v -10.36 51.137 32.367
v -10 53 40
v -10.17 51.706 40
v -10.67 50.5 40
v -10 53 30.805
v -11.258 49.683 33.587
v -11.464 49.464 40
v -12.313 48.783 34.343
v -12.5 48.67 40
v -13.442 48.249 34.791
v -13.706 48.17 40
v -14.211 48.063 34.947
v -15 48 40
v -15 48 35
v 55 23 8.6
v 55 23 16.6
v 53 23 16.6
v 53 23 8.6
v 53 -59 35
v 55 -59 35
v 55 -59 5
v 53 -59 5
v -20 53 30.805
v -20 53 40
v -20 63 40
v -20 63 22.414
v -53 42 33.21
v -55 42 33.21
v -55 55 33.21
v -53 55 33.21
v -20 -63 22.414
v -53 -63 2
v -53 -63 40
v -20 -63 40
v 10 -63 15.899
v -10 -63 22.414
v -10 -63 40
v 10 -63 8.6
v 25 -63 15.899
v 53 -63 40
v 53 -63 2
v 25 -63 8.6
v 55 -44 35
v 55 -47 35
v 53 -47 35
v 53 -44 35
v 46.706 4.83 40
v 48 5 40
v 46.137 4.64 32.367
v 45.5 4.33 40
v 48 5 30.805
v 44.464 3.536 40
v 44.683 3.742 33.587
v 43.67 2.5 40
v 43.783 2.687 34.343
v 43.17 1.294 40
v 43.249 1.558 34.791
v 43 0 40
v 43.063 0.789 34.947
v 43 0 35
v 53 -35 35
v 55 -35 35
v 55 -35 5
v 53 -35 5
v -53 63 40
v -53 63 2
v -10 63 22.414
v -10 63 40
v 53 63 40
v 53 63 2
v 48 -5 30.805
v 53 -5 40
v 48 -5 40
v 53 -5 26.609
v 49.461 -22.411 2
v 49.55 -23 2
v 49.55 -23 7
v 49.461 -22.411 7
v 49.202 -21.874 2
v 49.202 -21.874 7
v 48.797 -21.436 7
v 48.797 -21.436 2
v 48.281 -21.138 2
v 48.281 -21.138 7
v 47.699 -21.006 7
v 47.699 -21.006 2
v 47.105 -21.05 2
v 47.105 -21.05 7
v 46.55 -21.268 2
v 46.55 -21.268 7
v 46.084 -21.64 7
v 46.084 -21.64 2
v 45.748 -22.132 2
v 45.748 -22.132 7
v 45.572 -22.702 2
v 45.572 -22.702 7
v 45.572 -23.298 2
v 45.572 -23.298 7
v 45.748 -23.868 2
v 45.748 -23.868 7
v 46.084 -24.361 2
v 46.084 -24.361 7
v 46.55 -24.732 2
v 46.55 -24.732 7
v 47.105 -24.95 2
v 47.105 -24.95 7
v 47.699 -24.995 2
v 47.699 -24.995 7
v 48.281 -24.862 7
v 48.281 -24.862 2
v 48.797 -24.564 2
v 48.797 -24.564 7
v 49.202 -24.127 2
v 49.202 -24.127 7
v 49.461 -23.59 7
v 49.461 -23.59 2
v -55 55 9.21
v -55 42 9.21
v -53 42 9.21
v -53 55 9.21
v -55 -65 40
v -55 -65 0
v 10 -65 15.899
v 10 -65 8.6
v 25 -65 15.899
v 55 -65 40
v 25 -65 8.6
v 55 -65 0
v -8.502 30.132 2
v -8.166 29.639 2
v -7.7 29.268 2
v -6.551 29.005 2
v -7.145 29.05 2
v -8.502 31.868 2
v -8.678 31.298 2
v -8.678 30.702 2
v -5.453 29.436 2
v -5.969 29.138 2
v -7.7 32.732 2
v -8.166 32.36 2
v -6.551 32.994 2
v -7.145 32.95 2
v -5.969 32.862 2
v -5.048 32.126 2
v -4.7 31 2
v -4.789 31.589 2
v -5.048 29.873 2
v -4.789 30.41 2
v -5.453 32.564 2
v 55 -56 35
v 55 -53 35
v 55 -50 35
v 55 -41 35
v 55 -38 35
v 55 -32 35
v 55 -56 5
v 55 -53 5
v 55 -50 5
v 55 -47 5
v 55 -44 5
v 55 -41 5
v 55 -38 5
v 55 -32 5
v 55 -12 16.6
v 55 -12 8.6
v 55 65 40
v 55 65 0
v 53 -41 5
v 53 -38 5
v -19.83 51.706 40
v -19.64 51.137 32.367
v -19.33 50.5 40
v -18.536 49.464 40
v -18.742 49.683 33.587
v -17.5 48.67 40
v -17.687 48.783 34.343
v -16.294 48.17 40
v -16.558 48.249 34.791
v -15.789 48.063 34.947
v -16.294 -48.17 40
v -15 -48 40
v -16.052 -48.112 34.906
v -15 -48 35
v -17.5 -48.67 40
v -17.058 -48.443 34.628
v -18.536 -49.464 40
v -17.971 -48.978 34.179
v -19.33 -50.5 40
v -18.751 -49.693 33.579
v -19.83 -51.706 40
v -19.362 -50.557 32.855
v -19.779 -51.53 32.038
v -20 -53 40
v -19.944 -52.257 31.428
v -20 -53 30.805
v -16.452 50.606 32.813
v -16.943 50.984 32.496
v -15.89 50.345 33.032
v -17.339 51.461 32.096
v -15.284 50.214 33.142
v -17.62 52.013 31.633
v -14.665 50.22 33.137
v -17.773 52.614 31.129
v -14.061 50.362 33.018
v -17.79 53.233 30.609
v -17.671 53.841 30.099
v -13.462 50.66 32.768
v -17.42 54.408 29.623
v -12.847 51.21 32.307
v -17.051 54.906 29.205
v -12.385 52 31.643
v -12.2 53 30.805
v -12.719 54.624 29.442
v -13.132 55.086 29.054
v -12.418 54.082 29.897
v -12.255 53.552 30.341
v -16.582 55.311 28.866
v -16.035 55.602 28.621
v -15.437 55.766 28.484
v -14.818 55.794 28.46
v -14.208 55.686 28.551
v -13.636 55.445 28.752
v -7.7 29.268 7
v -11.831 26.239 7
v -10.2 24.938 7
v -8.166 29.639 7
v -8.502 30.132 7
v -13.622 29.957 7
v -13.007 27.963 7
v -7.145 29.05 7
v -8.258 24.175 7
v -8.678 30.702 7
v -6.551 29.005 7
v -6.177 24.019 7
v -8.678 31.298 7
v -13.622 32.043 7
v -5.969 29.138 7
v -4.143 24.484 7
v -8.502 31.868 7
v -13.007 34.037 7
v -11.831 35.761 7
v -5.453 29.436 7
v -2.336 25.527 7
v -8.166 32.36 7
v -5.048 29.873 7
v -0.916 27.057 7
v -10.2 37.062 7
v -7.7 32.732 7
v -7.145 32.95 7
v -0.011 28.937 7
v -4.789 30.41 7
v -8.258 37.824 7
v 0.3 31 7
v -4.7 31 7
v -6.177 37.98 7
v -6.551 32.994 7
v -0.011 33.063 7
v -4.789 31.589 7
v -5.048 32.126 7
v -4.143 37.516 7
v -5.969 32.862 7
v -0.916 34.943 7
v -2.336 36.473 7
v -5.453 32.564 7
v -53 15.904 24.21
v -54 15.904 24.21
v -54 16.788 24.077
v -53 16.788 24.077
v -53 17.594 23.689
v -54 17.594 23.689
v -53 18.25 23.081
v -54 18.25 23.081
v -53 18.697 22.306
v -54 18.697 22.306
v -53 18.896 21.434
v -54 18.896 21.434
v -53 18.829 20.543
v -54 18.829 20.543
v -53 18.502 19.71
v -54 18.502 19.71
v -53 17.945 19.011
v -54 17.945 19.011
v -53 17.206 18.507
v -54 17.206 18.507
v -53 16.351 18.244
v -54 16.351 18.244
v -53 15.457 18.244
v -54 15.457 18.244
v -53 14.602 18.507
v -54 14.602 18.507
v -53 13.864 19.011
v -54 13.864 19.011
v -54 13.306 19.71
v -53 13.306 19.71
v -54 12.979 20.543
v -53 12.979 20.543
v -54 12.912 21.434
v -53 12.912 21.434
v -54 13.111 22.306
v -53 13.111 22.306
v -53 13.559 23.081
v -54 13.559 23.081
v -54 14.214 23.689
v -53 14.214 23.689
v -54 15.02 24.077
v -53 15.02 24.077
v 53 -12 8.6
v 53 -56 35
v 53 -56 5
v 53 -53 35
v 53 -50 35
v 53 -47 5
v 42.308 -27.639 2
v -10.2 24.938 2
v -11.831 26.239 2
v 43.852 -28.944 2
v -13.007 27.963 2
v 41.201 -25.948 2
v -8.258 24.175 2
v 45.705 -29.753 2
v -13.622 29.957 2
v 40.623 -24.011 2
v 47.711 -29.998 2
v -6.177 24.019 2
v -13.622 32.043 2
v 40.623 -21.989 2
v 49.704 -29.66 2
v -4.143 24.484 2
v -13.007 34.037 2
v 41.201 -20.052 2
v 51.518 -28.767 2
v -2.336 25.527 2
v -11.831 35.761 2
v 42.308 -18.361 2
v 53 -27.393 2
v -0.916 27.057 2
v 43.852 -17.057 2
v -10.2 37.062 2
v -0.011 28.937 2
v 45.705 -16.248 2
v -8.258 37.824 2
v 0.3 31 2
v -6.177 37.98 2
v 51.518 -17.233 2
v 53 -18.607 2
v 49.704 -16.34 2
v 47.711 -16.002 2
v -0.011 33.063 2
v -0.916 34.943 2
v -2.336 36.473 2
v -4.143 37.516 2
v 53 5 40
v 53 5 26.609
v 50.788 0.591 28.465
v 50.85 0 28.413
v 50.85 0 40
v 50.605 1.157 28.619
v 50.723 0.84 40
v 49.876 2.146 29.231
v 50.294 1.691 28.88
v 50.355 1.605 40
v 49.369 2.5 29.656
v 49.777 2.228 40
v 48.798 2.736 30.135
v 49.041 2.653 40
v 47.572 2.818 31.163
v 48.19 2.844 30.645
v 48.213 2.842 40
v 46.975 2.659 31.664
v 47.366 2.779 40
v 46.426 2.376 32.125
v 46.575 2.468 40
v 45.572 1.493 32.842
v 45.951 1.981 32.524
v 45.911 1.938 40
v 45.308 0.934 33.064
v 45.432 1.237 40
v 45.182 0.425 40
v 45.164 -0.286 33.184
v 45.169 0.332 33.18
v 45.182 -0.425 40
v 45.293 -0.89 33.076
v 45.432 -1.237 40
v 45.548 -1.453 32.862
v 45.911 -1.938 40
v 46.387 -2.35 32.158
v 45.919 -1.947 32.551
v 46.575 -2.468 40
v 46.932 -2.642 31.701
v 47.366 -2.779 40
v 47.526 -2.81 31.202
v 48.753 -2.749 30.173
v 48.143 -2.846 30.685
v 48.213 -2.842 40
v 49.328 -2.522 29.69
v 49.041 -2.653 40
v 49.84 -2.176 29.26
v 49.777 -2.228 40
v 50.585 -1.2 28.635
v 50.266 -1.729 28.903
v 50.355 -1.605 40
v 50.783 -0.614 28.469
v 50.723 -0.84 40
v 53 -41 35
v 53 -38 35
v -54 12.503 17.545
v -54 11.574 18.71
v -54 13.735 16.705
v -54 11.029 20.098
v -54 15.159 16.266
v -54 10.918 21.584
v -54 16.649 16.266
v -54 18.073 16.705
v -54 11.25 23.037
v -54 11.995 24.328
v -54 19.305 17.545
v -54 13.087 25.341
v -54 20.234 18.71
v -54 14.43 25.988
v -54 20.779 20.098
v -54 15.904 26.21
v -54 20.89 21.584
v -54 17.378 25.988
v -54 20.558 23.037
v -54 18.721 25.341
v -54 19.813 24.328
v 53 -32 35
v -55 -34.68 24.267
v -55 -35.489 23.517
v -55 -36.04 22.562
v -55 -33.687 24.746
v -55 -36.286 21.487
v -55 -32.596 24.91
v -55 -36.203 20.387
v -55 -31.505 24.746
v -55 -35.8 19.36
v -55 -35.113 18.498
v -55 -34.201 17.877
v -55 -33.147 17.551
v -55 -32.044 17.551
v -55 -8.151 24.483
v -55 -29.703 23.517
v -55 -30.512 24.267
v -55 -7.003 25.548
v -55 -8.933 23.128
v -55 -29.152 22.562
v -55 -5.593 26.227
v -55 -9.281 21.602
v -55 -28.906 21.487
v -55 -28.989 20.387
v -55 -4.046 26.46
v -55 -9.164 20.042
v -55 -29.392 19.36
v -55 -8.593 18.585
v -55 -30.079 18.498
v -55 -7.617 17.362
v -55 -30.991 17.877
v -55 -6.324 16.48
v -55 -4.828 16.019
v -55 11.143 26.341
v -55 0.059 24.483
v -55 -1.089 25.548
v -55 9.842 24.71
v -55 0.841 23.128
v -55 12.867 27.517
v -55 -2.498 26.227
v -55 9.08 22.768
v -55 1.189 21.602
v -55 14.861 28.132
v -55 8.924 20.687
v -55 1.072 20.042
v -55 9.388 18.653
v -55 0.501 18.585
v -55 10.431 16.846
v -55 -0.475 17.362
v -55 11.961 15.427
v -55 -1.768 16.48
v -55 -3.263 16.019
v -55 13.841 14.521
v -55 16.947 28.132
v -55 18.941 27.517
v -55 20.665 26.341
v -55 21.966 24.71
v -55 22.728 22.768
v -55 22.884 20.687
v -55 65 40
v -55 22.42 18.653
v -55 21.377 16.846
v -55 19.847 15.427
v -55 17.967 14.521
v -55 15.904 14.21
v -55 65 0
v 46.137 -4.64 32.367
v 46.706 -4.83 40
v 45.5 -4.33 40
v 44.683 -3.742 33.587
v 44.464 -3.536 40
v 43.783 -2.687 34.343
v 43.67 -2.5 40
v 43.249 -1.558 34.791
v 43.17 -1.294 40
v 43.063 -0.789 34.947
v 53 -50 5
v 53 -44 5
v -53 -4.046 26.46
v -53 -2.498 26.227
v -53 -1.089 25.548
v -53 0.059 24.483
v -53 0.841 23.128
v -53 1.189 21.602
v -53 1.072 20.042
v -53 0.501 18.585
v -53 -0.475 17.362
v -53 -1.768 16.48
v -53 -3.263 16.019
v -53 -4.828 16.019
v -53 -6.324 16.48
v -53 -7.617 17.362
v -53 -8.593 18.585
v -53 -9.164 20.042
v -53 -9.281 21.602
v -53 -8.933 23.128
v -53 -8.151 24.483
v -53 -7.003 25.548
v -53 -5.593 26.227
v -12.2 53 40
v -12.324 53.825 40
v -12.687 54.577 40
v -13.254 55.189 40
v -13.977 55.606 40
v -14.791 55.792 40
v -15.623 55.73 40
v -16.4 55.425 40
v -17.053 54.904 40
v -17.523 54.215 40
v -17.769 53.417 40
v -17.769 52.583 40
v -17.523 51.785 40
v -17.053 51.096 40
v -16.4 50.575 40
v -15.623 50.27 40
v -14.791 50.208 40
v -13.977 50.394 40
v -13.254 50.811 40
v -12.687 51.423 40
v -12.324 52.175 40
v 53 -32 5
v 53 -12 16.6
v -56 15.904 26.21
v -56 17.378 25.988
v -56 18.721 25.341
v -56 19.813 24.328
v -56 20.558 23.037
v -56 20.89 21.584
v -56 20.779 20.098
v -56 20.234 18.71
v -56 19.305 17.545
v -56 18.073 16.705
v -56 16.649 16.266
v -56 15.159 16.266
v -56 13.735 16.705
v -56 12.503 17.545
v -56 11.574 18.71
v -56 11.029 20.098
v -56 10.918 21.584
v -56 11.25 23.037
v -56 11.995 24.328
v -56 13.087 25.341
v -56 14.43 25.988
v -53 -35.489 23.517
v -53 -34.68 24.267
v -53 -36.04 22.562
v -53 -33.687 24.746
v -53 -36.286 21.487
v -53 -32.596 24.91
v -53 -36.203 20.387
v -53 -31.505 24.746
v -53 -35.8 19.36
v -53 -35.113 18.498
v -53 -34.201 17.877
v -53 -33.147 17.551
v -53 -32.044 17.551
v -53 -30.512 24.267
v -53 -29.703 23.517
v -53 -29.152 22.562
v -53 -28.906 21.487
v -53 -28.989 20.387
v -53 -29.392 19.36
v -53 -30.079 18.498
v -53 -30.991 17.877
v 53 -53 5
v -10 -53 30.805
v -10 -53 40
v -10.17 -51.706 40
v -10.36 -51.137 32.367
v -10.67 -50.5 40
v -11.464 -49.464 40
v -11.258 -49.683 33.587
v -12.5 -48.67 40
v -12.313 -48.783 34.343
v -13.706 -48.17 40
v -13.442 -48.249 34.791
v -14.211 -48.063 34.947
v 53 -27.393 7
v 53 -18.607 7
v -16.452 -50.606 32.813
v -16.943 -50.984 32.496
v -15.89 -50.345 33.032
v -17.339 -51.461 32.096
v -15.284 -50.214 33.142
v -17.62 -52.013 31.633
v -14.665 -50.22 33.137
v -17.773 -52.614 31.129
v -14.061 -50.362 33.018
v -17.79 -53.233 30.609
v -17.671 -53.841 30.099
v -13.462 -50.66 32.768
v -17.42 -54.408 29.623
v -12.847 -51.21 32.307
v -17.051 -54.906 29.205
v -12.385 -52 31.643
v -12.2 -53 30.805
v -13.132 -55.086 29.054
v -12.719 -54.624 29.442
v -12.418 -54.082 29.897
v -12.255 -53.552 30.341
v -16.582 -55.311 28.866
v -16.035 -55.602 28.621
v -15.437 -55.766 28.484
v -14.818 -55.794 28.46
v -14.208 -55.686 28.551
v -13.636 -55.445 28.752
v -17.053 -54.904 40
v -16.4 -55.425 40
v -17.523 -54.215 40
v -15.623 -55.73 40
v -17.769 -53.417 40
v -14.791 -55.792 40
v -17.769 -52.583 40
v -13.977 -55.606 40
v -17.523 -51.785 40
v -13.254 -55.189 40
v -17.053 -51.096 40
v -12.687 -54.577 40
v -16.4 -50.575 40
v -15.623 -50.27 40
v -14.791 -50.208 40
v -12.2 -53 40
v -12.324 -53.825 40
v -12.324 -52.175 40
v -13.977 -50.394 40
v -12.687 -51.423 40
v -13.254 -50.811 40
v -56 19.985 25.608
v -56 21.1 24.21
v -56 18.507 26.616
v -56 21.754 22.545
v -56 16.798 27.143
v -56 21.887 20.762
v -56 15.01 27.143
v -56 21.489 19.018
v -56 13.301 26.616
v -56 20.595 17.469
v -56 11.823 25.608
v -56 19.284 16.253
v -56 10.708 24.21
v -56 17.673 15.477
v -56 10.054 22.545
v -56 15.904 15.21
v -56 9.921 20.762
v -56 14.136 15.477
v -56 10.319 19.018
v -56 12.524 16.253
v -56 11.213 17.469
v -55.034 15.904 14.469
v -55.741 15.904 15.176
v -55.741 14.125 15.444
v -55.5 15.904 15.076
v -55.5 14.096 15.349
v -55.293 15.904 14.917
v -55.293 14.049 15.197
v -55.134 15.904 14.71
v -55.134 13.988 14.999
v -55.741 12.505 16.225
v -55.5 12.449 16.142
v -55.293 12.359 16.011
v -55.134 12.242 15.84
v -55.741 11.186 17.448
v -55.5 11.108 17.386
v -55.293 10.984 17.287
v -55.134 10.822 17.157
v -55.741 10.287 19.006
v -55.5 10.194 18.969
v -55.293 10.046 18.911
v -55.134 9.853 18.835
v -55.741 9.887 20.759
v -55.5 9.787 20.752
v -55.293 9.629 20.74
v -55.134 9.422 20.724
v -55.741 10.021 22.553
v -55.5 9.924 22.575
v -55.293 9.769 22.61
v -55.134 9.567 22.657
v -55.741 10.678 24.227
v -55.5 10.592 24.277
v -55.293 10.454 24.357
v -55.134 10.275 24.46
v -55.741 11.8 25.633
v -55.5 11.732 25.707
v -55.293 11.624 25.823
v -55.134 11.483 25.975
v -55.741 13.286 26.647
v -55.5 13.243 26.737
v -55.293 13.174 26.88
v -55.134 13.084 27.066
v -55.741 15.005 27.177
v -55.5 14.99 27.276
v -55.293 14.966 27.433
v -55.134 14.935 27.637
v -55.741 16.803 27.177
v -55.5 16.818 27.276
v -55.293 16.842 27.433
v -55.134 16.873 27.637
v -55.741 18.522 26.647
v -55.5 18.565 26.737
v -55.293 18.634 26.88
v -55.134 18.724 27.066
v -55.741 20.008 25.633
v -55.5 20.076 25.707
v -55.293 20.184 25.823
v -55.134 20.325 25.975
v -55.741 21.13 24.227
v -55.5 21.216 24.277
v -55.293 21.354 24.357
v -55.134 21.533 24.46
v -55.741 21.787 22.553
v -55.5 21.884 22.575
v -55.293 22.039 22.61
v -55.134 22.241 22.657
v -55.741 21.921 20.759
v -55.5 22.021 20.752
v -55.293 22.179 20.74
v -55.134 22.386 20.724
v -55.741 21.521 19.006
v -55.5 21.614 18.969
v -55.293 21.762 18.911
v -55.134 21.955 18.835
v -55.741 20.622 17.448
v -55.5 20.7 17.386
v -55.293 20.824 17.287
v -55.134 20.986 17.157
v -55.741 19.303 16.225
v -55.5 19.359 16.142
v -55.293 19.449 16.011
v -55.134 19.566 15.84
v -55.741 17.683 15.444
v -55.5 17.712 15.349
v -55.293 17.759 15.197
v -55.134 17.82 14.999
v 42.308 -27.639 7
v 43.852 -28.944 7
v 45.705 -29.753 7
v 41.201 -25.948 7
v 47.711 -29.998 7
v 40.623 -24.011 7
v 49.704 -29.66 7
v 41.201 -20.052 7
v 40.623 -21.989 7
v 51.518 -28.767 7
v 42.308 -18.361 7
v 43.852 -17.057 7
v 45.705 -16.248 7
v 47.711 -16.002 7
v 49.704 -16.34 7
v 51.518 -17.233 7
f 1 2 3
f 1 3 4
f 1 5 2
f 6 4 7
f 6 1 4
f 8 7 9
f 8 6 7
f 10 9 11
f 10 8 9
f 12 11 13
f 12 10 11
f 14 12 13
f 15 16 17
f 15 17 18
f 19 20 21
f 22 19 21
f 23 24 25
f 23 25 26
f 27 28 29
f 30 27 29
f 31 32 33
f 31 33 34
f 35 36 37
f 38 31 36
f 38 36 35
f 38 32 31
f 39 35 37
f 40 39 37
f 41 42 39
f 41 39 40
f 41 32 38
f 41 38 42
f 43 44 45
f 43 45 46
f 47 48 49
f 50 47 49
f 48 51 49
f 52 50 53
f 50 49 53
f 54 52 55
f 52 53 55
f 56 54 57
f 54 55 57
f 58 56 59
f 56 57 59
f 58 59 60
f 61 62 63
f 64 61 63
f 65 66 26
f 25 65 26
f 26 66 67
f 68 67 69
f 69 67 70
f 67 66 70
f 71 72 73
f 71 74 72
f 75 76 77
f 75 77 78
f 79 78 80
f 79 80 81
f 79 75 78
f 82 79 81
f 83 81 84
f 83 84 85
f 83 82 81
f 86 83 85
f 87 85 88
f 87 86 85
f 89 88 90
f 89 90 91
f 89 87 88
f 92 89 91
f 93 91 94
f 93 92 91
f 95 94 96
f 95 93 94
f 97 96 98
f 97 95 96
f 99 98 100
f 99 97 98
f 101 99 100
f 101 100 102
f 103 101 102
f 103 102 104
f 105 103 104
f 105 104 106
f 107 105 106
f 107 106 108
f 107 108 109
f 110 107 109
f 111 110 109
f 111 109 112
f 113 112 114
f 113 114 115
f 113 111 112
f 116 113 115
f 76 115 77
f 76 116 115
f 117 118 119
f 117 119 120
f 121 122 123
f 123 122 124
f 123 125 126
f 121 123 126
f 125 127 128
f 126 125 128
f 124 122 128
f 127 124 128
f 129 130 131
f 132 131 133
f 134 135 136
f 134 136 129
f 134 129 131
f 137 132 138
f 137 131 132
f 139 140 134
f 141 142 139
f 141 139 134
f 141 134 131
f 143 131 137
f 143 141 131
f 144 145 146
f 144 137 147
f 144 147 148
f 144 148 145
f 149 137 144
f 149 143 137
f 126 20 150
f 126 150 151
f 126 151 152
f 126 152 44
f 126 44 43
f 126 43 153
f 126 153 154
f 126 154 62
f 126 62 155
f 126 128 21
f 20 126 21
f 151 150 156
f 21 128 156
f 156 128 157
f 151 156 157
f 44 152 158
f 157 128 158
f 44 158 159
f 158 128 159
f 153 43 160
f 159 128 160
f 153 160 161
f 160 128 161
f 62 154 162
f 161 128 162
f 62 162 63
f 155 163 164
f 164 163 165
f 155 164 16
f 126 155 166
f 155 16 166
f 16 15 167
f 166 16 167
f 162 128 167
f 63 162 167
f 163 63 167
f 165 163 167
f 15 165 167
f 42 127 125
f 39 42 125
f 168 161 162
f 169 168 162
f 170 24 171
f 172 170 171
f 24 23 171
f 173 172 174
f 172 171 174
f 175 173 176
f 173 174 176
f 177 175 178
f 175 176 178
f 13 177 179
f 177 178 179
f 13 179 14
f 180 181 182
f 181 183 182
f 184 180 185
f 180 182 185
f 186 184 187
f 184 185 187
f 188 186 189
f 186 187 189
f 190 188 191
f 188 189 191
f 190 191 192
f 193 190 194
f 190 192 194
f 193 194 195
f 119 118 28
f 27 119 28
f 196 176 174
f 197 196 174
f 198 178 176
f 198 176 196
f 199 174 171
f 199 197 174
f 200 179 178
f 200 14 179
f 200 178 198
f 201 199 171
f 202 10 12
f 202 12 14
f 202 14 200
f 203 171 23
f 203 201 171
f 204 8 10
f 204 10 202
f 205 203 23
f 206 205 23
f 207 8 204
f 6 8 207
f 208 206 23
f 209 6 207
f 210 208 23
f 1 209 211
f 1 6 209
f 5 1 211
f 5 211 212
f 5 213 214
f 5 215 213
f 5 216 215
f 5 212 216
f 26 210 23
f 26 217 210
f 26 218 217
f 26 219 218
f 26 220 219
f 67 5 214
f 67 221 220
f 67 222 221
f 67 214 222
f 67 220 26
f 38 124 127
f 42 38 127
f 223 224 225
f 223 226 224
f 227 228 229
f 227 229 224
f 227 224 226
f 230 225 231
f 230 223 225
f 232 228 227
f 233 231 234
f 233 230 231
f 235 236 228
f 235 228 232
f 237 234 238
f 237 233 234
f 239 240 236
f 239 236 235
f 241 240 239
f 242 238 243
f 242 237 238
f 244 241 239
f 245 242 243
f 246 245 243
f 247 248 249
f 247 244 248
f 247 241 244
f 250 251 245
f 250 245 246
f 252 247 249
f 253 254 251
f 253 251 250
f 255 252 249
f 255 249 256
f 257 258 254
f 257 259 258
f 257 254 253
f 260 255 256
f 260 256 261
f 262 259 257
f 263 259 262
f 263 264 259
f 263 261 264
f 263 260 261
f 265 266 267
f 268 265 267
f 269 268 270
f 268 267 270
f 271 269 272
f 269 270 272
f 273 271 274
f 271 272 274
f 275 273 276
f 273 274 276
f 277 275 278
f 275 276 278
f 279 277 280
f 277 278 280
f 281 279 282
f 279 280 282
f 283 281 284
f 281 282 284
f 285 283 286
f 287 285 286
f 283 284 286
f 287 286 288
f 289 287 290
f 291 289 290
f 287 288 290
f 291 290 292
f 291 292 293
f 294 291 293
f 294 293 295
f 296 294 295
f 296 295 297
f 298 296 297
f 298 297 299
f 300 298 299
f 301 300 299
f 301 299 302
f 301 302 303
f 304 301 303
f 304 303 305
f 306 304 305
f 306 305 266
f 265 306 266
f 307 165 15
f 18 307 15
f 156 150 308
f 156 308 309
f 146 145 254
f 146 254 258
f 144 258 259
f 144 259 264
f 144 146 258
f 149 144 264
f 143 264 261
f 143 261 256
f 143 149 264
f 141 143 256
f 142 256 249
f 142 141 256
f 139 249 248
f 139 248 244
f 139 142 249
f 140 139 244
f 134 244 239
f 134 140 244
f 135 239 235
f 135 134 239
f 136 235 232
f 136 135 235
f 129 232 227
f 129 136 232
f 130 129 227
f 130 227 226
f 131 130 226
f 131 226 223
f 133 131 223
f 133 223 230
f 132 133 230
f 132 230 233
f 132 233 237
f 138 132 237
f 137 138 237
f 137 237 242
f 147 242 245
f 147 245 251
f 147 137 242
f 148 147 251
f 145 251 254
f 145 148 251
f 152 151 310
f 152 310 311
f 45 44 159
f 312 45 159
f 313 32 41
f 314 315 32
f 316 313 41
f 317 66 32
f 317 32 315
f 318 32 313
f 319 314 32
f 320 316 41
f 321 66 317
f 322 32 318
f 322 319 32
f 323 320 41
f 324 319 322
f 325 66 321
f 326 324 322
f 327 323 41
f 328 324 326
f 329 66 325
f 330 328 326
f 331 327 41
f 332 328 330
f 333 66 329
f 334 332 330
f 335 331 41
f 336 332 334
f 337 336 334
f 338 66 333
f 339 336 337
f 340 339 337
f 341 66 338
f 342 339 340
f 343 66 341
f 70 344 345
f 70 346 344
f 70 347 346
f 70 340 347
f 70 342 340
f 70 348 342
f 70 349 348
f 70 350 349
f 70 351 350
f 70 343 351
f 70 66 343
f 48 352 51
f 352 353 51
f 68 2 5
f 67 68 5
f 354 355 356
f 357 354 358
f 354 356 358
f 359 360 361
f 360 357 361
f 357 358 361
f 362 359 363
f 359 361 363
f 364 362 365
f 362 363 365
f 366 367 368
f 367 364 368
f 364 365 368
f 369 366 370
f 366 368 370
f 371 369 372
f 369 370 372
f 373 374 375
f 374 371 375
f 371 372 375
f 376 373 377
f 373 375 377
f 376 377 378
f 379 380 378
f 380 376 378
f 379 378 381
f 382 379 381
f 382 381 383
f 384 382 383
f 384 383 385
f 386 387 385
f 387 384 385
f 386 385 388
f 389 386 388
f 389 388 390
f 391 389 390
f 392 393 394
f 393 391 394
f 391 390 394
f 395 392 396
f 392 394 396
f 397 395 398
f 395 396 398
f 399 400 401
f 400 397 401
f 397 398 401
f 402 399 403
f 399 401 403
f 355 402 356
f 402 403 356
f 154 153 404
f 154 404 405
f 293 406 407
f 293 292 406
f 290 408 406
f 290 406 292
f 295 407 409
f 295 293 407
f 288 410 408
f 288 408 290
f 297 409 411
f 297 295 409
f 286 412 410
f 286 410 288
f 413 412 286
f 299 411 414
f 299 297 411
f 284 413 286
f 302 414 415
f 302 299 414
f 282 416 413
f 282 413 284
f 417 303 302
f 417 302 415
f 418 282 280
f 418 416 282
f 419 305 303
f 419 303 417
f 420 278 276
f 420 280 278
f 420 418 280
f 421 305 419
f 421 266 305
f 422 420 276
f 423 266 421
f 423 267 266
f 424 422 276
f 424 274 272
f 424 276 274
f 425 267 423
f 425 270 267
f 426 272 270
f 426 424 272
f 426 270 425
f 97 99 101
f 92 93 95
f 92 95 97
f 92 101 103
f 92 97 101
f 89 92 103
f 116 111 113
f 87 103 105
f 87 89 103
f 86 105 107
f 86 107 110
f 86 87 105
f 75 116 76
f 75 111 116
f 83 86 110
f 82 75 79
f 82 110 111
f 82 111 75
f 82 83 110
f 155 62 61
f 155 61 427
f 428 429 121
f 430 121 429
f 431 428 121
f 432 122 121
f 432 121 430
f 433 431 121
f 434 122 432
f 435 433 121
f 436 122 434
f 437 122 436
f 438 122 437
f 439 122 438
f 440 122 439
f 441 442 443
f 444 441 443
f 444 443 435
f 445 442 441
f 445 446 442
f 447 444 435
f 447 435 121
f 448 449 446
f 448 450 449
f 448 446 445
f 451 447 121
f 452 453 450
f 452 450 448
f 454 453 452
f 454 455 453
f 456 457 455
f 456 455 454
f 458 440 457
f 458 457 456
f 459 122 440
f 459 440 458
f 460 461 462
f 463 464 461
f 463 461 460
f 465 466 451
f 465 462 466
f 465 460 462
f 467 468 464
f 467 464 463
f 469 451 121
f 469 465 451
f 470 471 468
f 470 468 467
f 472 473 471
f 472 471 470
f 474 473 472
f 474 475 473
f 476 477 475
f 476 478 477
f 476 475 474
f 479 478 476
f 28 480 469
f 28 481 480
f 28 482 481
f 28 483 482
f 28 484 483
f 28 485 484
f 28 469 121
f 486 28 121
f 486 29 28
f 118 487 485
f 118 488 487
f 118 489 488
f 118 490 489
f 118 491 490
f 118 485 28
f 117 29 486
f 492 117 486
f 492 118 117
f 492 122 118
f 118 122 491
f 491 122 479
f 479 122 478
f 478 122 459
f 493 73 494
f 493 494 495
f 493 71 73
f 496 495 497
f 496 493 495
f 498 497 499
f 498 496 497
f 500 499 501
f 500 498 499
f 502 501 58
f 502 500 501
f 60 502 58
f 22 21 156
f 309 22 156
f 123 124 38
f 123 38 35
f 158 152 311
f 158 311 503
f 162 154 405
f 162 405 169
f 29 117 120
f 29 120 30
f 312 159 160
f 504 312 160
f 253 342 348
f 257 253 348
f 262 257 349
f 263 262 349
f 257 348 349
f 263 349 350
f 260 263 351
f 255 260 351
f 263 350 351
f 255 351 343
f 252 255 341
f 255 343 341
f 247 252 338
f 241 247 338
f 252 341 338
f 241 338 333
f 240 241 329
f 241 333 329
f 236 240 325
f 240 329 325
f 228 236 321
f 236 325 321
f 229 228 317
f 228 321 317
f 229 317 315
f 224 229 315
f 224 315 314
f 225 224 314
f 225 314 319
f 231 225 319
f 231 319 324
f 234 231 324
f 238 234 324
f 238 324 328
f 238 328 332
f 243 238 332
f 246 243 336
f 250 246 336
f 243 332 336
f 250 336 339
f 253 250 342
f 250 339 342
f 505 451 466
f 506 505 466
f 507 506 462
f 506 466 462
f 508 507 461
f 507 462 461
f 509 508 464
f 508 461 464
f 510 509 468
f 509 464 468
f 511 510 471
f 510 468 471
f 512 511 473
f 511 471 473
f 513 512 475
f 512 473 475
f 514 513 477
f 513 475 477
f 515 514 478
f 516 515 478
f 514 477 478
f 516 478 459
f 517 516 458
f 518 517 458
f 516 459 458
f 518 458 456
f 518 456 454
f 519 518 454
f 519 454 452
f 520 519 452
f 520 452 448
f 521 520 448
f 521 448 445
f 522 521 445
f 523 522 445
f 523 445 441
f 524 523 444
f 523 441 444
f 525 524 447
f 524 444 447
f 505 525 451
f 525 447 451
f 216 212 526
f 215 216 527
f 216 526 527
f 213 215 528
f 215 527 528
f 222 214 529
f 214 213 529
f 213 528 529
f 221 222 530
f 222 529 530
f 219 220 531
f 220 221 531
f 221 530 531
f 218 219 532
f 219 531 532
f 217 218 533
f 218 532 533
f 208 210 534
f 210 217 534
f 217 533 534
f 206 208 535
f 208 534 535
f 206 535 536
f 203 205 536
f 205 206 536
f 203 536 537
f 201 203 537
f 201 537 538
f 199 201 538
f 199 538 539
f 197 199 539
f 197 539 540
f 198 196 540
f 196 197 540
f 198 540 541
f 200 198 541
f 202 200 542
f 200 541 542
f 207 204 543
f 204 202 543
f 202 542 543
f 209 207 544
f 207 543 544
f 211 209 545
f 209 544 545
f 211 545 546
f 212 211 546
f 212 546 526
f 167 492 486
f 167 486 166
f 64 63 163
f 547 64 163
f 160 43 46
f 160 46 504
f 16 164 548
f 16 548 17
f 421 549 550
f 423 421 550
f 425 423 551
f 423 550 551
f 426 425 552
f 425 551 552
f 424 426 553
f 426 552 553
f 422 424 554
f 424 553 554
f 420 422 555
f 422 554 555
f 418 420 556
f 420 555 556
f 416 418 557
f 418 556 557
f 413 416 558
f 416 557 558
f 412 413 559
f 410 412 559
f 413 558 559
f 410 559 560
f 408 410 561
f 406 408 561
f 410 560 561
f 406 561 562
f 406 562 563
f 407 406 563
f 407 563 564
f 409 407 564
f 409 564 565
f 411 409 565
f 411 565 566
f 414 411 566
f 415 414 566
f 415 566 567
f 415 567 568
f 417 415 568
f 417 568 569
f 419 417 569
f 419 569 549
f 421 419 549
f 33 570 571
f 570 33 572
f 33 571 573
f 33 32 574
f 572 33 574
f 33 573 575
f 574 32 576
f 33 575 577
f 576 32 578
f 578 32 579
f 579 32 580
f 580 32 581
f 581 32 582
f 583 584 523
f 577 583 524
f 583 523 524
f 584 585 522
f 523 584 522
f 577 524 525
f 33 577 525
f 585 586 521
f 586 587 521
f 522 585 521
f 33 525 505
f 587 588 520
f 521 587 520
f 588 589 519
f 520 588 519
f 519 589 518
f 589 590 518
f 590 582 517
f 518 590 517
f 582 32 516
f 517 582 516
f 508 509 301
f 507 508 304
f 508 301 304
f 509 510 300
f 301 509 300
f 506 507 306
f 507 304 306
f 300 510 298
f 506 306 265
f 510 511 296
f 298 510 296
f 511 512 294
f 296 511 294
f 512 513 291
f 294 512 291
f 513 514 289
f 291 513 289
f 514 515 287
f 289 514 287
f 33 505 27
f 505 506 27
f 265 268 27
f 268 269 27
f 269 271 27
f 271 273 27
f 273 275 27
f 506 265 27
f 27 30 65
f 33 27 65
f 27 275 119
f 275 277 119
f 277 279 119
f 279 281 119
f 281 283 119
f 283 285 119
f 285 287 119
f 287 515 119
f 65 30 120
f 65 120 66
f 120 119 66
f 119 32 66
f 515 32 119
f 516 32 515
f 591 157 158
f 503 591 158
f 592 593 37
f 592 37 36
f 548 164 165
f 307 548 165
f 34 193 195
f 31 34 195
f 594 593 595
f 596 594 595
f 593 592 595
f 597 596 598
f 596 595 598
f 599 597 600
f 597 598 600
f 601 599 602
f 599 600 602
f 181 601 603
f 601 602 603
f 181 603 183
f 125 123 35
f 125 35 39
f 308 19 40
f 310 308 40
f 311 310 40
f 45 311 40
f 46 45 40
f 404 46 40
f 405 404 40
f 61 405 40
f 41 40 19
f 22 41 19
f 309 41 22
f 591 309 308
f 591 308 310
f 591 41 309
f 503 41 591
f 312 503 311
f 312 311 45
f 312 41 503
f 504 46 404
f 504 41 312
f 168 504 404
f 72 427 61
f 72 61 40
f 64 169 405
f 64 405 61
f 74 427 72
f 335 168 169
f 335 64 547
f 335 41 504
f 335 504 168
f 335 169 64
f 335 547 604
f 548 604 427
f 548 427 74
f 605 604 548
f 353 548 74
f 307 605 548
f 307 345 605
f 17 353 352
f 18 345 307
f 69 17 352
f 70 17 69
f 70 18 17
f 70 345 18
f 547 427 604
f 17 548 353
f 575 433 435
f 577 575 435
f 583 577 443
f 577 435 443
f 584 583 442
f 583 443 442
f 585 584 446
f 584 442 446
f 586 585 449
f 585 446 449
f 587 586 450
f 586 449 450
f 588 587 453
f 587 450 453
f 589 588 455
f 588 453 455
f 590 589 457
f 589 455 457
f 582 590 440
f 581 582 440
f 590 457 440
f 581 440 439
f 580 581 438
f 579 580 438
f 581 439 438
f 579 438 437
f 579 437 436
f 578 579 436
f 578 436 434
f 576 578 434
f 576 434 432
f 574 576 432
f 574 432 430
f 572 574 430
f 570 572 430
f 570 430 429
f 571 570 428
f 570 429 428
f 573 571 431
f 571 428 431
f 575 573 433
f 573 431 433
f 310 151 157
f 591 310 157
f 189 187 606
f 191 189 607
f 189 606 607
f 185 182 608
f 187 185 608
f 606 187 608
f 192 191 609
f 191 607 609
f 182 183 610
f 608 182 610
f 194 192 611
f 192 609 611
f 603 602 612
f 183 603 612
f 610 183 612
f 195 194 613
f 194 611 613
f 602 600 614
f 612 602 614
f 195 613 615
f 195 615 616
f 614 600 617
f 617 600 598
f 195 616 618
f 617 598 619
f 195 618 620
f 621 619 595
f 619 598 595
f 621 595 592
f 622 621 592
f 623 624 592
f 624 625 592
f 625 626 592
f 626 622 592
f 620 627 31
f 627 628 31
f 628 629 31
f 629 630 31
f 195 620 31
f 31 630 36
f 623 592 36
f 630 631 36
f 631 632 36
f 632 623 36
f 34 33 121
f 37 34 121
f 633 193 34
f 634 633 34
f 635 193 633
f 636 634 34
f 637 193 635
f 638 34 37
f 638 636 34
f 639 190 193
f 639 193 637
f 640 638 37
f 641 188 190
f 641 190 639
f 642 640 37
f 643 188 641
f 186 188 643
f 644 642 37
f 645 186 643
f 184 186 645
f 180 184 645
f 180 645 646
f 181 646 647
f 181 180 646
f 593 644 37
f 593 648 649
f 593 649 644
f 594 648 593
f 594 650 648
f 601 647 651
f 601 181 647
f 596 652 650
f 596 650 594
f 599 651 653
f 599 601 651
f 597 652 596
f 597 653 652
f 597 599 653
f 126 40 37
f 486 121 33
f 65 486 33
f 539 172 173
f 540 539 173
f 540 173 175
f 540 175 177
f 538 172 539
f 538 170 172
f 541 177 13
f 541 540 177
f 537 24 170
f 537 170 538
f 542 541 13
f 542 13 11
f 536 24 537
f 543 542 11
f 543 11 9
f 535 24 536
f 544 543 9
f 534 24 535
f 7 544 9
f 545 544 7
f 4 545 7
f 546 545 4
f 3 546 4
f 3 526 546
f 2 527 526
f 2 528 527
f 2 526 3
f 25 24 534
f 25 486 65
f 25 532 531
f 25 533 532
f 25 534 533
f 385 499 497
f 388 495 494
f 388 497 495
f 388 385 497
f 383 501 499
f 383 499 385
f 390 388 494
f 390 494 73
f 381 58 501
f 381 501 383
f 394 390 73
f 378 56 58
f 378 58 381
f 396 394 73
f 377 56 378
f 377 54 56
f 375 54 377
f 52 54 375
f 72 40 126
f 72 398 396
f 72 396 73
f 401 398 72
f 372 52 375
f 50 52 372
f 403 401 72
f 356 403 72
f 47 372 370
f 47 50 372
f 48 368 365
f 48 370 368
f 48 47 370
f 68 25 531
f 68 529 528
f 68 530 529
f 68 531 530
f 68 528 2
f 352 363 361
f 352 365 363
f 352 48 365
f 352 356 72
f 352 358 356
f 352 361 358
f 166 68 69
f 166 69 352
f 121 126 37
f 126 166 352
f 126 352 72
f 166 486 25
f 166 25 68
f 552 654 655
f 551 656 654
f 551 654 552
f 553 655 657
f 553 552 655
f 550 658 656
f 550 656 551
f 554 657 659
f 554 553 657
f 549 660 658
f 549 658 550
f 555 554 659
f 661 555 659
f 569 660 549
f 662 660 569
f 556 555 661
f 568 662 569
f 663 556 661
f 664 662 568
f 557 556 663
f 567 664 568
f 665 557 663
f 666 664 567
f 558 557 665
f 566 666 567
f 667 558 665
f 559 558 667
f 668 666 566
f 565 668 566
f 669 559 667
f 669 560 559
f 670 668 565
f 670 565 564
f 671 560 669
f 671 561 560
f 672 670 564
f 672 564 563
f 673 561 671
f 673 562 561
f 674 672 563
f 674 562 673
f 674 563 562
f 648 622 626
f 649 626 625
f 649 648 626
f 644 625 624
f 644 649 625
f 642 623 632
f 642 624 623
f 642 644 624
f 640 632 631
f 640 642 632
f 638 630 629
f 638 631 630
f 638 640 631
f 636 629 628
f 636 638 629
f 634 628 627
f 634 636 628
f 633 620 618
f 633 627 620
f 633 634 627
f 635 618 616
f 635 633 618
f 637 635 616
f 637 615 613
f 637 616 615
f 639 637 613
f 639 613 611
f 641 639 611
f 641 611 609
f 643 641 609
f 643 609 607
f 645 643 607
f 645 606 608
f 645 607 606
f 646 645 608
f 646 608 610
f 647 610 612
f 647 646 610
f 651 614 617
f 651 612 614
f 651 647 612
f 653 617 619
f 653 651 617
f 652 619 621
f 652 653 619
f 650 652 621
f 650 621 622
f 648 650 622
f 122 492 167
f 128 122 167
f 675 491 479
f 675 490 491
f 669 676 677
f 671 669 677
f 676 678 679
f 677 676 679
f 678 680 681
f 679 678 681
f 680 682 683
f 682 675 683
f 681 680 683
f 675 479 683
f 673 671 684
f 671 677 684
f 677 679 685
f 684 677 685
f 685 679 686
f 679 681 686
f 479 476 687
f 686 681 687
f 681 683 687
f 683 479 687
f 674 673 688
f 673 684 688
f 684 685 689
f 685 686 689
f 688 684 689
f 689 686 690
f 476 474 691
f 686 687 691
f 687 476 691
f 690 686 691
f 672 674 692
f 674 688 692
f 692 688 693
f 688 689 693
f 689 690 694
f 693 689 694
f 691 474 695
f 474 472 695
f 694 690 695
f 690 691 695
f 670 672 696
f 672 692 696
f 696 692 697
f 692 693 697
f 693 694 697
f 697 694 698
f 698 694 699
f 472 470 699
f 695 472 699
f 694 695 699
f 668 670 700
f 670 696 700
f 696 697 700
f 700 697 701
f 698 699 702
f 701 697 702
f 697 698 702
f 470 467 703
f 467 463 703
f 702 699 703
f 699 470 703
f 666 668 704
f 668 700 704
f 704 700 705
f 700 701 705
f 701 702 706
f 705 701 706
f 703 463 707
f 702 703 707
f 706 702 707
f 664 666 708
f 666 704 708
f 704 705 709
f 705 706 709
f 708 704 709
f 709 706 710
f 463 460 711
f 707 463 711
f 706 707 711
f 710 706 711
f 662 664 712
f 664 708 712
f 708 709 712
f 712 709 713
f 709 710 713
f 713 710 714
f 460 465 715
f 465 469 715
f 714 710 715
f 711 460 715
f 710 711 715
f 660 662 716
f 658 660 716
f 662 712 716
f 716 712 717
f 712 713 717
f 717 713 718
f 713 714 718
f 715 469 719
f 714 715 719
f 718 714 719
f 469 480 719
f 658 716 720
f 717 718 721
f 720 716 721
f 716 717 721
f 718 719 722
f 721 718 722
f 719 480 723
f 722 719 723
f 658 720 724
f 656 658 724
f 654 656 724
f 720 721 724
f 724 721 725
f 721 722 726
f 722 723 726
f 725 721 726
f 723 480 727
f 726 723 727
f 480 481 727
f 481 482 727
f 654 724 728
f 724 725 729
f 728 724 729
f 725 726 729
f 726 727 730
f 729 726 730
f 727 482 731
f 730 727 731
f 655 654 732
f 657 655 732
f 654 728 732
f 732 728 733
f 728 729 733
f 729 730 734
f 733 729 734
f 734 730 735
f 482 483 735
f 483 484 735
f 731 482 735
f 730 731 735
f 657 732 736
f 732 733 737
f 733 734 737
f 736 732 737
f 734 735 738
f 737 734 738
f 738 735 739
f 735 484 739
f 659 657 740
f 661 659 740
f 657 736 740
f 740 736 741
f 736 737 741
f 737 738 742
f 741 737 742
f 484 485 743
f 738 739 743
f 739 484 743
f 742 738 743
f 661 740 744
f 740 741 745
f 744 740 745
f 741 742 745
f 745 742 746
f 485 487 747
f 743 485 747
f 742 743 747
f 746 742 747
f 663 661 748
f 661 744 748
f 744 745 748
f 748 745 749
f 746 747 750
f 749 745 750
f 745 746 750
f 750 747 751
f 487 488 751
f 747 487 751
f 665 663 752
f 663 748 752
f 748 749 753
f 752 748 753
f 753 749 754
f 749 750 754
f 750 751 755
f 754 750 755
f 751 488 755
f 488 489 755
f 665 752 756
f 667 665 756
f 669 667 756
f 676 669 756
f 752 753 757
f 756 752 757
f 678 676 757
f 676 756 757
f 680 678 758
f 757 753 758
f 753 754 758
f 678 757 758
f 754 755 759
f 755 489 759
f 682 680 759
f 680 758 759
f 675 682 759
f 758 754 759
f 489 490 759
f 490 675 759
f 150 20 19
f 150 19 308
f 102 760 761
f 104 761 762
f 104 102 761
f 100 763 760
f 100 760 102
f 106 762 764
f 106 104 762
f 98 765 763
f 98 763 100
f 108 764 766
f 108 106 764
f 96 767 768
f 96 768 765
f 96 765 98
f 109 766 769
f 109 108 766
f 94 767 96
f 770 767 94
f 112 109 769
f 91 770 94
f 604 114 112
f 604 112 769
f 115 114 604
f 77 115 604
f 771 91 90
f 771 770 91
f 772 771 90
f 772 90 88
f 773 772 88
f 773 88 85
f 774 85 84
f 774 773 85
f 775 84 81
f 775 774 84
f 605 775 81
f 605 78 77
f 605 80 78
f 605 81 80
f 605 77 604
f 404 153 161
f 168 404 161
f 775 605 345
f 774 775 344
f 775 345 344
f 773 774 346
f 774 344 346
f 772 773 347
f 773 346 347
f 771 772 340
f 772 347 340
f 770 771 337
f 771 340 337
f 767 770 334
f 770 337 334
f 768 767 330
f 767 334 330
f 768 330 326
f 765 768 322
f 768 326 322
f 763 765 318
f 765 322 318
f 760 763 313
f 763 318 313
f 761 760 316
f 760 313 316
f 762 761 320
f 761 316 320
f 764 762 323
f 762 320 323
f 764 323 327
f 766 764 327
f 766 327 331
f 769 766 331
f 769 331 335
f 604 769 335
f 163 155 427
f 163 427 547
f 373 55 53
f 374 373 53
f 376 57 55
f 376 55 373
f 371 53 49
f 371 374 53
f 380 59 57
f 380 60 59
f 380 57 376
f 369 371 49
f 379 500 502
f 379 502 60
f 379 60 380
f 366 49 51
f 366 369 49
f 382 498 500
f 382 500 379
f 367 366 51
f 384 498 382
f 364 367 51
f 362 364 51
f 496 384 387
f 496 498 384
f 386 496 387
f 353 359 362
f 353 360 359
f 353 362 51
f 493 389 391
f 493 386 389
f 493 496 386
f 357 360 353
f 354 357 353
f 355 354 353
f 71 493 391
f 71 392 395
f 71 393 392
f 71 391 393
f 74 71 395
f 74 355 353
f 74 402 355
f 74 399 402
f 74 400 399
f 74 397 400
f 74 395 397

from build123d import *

# Parameters (mm, degrees)
SKETCH1_W                = 110
SKETCH1_H                = 130
BOSS_EXTRUDE1_DEPTH      = 40
SHELL1_T                 = -2
SKETCH2_W                = 15
SKETCH2_H                = 7.298661228
CUT_EXTRUDE1_DEPTH       = 2
SKETCH3_W                = 8
SKETCH3_H                = 35
CUT_EXTRUDE2_DEPTH       = 2
SKETCH5_R                = 3
SKETCH5_R_2              = 5.25
SKETCH5_R_3              = 3.7
SKETCH5_W                = 24
SKETCH5_H                = 13
CUT_EXTRUDE3_DEPTH       = 2
SKETCH6_W                = 30
SKETCH6_H                = 3
CUT_EXTRUDE4_DEPTH       = 2
SKETCH7_R                = 7
SKETCH7_R_2              = 2
BOSS_EXTRUDE2_DEPTH      = 5
BOSS_EXTRUDE3_DEPTH      = 5
FILLET1_R                = 5
BOSS_EXTRUDE4_DEPTH      = 5
BOSS_EXTRUDE4_DEPTH_BACK = 5
FILLET2_R                = 5
CUT_EXTRUDE9_REACH       = 96.074
SKETCH11_R               = 2.8
CUT_EXTRUDE10_REACH      = 96.074
SKETCH13_R               = 2.85
FILLET1_OF_MIRROR1_R     = 5
SKETCH14_R               = 5
CUT_EXTRUDE11_DEPTH      = 1
BOSS_EXTRUDE5_START      = 1
SKETCH15_R               = 6
SKETCH15_R_2             = 5
BOSS_EXTRUDE5_DEPTH      = 1
FILLET3_R                = 1


with BuildPart() as part:
    # Sketch1 → Boss-Extrude1 (new body)
    with BuildSketch(Plane.XY):
        Rectangle(SKETCH1_W, SKETCH1_H)
    extrude(amount=BOSS_EXTRUDE1_DEPTH)

    # Shell1
    shell1_openings = [part.faces().sort_by_distance(p)[0] for p in [
        (0, 0, 40),
    ]]
    offset(amount=SHELL1_T, openings=shell1_openings, kind=Kind.INTERSECTION)

    # Sketch2 → Cut-Extrude1 (cut)
    with BuildSketch(Plane.XZ.offset(65)):
        with Locations((17.5, 12.249330614)):
            Rectangle(SKETCH2_W, SKETCH2_H)
    extrude(amount=-CUT_EXTRUDE1_DEPTH, mode=Mode.SUBTRACT)

    # Sketch3 → Cut-Extrude2 (cut)
    with BuildSketch(Plane(origin=(55, 0, 0), x_dir=(0, 0, -1), z_dir=(1, 0, 0))):
        with Locations((-12.6, 5.5)):
            Rectangle(SKETCH3_W, SKETCH3_H)
    extrude(amount=-CUT_EXTRUDE2_DEPTH, mode=Mode.SUBTRACT)

    # Sketch5 → Cut-Extrude3 (cut)
    with BuildSketch(Plane.ZY.offset(55)):
        with Locations((21.210132709, 15.904045732)):
            Circle(SKETCH5_R)
        with Locations((21.210132709, -4.045954268)):
            Circle(SKETCH5_R_2)
        with Locations((21.210132709, -32.595954268)):
            Circle(SKETCH5_R_3)
        with Locations((21.210132709, 48.5)):
            Rectangle(SKETCH5_W, SKETCH5_H)
    extrude(amount=-CUT_EXTRUDE3_DEPTH, mode=Mode.SUBTRACT)

    # Sketch6 → Cut-Extrude4 (cut)
    with BuildSketch(Plane(origin=(55, 0, 0), x_dir=(0, 0, -1), z_dir=(1, 0, 0))):
        with Locations((-20, -33.5)):
            Rectangle(SKETCH6_W, SKETCH6_H)
        with Locations((-20, -39.5)):
            Rectangle(SKETCH6_W, SKETCH6_H)
        with Locations((-20, -45.5)):
            Rectangle(SKETCH6_W, SKETCH6_H)
        with Locations((-20, -51.5)):
            Rectangle(SKETCH6_W, SKETCH6_H)
        with Locations((-20, -57.5)):
            Rectangle(SKETCH6_W, SKETCH6_H)
    extrude(amount=-CUT_EXTRUDE4_DEPTH, mode=Mode.SUBTRACT)

    # Sketch7 → Boss-Extrude2 (add)
    # profile 1 of 2: a face of its own
    with BuildSketch(Plane.XY.offset(2)):
        with Locations((-6.7, 30.999839281)):
            Circle(SKETCH7_R)
        with Locations((-6.7, 30.999839281)):
            Circle(SKETCH7_R_2, mode=Mode.SUBTRACT)
    # profile 2 of 2: a face of its own
    with BuildSketch(Plane.XY.offset(2)):
        with Locations((47.55, -23.000160719)):
            Circle(SKETCH7_R)
        with Locations((47.55, -23.000160719)):
            Circle(SKETCH7_R_2, mode=Mode.SUBTRACT)
    extrude(amount=BOSS_EXTRUDE2_DEPTH)

    # Sketch9 → Boss-Extrude3 (add, symmetric)
    with BuildSketch(Plane(origin=(-15, 0, 0), x_dir=(0, 0, -1), z_dir=(1, 0, 0))):
        Polygon((-40, 63), (-40, 48), (-35, 48), (-22.413505532, 63), align=None)
    boss_extrude3 = extrude(amount=BOSS_EXTRUDE3_DEPTH, both=True)

    # Fillet1
    fillet1_edges = [part.edges().sort_by_distance(p)[0] for p in [
        (-10, 48, 37.5),
        (-20, 48, 37.5),
    ]]
    fillet(fillet1_edges, radius=FILLET1_R - 0.0001)  # a hair under: the kernel refuses the full size

    # Sketch10 → Boss-Extrude4 (add, two sides: drawn at the far end of the back side and taken through both)
    with BuildSketch(Plane(origin=(0, 0, 0), x_dir=(1, 0, 0), z_dir=(0, 1, 0)).offset(-BOSS_EXTRUDE4_DEPTH_BACK)):
        Polygon((53, -26.609003688), (53, -40), (43, -40), (43, -35), align=None)
    extrude(amount=BOSS_EXTRUDE4_DEPTH + BOSS_EXTRUDE4_DEPTH_BACK)

    # Fillet2
    fillet2_edges = [part.edges().sort_by_distance(p)[0] for p in [
        (43, 5, 37.5),
        (43, -5, 37.5),
    ]]
    fillet(fillet2_edges, radius=FILLET2_R - 0.0001)  # a hair under: the kernel refuses the full size

    # Cut-Extrude9: up to this plane
    cut_extrude9_end = Plane(origin=(-20, 48, 35), z_dir=(0, -0.6427876096865434, -0.7660444431189748))
    # Sketch11 → Cut-Extrude9 (cut, up to the surface)
    with BuildSketch(Plane.XY.offset(40), mode=Mode.PRIVATE) as cut_extrude9_sk1:
        with Locations((-15, 53)):
            Circle(SKETCH11_R)
    cut_extrude9_tool1 = split(extrude(cut_extrude9_sk1.sketch, amount=-CUT_EXTRUDE9_REACH, mode=Mode.PRIVATE), bisect_by=cut_extrude9_end, keep=Keep.BOTH, mode=Mode.PRIVATE)
    cut_extrude9 = cut_extrude9_tool1.solids().sort_by_distance((-15, 53, 40))[0]
    add(cut_extrude9, mode=Mode.SUBTRACT)

    # Cut-Extrude10: up to this plane
    cut_extrude10_end = Plane(origin=(43, -5, 35), z_dir=(-0.6427876096865458, 0, -0.7660444431189727))
    # Sketch13 → Cut-Extrude10 (cut, up to the surface)
    with BuildSketch(Plane.XY.offset(40), mode=Mode.PRIVATE) as cut_extrude10_sk1:
        with Locations((48, 0)):
            Circle(SKETCH13_R)
    cut_extrude10_tool1 = split(extrude(cut_extrude10_sk1.sketch, amount=-CUT_EXTRUDE10_REACH, mode=Mode.PRIVATE), bisect_by=cut_extrude10_end, keep=Keep.BOTH, mode=Mode.PRIVATE)
    add(cut_extrude10_tool1.solids().sort_by_distance((48, 0, 40))[0], mode=Mode.SUBTRACT)

    # Mirror1: Boss-Extrude3, Cut-Extrude9 across plane
    add(boss_extrude3.mirror(Plane.ZX))
    add(cut_extrude9.mirror(Plane.ZX), mode=Mode.SUBTRACT)

    # Fillet1 of Mirror1
    fillet1_of_mirror1_edges = [part.edges().sort_by_distance(p)[0] for p in [
        (-10, -48, 37.5),
        (-20, -48, 37.5),
    ]]
    fillet(fillet1_of_mirror1_edges, radius=FILLET1_OF_MIRROR1_R - 0.0001)  # a hair under: the kernel refuses the full size

    # Sketch14 → Cut-Extrude11 (cut)
    with BuildSketch(Plane.ZY.offset(55)):
        with Locations((21.210132709, 15.904045732)):
            Circle(SKETCH14_R)
    extrude(amount=-CUT_EXTRUDE11_DEPTH, mode=Mode.SUBTRACT)

    # Sketch15 → Boss-Extrude5 (add)
    with BuildSketch(Plane.ZY.offset(55).offset(BOSS_EXTRUDE5_START)):
        with Locations(Location((21.210132709, 15.904045732, 0), (0, 0, 180))):
            Circle(SKETCH15_R)
        with Locations((21.210132709, 15.904045732)):
            Circle(SKETCH15_R_2, mode=Mode.SUBTRACT)
    extrude(amount=-BOSS_EXTRUDE5_DEPTH)

    # Fillet3
    fillet3_edges = [part.edges().sort_by_distance(p)[0] for p in [
        (-55, 15.904045732, 27.210132709),
    ]]
    fillet(fillet3_edges, radius=FILLET3_R - 0.0001)  # a hair under: the kernel refuses the full size


solid = part.part
